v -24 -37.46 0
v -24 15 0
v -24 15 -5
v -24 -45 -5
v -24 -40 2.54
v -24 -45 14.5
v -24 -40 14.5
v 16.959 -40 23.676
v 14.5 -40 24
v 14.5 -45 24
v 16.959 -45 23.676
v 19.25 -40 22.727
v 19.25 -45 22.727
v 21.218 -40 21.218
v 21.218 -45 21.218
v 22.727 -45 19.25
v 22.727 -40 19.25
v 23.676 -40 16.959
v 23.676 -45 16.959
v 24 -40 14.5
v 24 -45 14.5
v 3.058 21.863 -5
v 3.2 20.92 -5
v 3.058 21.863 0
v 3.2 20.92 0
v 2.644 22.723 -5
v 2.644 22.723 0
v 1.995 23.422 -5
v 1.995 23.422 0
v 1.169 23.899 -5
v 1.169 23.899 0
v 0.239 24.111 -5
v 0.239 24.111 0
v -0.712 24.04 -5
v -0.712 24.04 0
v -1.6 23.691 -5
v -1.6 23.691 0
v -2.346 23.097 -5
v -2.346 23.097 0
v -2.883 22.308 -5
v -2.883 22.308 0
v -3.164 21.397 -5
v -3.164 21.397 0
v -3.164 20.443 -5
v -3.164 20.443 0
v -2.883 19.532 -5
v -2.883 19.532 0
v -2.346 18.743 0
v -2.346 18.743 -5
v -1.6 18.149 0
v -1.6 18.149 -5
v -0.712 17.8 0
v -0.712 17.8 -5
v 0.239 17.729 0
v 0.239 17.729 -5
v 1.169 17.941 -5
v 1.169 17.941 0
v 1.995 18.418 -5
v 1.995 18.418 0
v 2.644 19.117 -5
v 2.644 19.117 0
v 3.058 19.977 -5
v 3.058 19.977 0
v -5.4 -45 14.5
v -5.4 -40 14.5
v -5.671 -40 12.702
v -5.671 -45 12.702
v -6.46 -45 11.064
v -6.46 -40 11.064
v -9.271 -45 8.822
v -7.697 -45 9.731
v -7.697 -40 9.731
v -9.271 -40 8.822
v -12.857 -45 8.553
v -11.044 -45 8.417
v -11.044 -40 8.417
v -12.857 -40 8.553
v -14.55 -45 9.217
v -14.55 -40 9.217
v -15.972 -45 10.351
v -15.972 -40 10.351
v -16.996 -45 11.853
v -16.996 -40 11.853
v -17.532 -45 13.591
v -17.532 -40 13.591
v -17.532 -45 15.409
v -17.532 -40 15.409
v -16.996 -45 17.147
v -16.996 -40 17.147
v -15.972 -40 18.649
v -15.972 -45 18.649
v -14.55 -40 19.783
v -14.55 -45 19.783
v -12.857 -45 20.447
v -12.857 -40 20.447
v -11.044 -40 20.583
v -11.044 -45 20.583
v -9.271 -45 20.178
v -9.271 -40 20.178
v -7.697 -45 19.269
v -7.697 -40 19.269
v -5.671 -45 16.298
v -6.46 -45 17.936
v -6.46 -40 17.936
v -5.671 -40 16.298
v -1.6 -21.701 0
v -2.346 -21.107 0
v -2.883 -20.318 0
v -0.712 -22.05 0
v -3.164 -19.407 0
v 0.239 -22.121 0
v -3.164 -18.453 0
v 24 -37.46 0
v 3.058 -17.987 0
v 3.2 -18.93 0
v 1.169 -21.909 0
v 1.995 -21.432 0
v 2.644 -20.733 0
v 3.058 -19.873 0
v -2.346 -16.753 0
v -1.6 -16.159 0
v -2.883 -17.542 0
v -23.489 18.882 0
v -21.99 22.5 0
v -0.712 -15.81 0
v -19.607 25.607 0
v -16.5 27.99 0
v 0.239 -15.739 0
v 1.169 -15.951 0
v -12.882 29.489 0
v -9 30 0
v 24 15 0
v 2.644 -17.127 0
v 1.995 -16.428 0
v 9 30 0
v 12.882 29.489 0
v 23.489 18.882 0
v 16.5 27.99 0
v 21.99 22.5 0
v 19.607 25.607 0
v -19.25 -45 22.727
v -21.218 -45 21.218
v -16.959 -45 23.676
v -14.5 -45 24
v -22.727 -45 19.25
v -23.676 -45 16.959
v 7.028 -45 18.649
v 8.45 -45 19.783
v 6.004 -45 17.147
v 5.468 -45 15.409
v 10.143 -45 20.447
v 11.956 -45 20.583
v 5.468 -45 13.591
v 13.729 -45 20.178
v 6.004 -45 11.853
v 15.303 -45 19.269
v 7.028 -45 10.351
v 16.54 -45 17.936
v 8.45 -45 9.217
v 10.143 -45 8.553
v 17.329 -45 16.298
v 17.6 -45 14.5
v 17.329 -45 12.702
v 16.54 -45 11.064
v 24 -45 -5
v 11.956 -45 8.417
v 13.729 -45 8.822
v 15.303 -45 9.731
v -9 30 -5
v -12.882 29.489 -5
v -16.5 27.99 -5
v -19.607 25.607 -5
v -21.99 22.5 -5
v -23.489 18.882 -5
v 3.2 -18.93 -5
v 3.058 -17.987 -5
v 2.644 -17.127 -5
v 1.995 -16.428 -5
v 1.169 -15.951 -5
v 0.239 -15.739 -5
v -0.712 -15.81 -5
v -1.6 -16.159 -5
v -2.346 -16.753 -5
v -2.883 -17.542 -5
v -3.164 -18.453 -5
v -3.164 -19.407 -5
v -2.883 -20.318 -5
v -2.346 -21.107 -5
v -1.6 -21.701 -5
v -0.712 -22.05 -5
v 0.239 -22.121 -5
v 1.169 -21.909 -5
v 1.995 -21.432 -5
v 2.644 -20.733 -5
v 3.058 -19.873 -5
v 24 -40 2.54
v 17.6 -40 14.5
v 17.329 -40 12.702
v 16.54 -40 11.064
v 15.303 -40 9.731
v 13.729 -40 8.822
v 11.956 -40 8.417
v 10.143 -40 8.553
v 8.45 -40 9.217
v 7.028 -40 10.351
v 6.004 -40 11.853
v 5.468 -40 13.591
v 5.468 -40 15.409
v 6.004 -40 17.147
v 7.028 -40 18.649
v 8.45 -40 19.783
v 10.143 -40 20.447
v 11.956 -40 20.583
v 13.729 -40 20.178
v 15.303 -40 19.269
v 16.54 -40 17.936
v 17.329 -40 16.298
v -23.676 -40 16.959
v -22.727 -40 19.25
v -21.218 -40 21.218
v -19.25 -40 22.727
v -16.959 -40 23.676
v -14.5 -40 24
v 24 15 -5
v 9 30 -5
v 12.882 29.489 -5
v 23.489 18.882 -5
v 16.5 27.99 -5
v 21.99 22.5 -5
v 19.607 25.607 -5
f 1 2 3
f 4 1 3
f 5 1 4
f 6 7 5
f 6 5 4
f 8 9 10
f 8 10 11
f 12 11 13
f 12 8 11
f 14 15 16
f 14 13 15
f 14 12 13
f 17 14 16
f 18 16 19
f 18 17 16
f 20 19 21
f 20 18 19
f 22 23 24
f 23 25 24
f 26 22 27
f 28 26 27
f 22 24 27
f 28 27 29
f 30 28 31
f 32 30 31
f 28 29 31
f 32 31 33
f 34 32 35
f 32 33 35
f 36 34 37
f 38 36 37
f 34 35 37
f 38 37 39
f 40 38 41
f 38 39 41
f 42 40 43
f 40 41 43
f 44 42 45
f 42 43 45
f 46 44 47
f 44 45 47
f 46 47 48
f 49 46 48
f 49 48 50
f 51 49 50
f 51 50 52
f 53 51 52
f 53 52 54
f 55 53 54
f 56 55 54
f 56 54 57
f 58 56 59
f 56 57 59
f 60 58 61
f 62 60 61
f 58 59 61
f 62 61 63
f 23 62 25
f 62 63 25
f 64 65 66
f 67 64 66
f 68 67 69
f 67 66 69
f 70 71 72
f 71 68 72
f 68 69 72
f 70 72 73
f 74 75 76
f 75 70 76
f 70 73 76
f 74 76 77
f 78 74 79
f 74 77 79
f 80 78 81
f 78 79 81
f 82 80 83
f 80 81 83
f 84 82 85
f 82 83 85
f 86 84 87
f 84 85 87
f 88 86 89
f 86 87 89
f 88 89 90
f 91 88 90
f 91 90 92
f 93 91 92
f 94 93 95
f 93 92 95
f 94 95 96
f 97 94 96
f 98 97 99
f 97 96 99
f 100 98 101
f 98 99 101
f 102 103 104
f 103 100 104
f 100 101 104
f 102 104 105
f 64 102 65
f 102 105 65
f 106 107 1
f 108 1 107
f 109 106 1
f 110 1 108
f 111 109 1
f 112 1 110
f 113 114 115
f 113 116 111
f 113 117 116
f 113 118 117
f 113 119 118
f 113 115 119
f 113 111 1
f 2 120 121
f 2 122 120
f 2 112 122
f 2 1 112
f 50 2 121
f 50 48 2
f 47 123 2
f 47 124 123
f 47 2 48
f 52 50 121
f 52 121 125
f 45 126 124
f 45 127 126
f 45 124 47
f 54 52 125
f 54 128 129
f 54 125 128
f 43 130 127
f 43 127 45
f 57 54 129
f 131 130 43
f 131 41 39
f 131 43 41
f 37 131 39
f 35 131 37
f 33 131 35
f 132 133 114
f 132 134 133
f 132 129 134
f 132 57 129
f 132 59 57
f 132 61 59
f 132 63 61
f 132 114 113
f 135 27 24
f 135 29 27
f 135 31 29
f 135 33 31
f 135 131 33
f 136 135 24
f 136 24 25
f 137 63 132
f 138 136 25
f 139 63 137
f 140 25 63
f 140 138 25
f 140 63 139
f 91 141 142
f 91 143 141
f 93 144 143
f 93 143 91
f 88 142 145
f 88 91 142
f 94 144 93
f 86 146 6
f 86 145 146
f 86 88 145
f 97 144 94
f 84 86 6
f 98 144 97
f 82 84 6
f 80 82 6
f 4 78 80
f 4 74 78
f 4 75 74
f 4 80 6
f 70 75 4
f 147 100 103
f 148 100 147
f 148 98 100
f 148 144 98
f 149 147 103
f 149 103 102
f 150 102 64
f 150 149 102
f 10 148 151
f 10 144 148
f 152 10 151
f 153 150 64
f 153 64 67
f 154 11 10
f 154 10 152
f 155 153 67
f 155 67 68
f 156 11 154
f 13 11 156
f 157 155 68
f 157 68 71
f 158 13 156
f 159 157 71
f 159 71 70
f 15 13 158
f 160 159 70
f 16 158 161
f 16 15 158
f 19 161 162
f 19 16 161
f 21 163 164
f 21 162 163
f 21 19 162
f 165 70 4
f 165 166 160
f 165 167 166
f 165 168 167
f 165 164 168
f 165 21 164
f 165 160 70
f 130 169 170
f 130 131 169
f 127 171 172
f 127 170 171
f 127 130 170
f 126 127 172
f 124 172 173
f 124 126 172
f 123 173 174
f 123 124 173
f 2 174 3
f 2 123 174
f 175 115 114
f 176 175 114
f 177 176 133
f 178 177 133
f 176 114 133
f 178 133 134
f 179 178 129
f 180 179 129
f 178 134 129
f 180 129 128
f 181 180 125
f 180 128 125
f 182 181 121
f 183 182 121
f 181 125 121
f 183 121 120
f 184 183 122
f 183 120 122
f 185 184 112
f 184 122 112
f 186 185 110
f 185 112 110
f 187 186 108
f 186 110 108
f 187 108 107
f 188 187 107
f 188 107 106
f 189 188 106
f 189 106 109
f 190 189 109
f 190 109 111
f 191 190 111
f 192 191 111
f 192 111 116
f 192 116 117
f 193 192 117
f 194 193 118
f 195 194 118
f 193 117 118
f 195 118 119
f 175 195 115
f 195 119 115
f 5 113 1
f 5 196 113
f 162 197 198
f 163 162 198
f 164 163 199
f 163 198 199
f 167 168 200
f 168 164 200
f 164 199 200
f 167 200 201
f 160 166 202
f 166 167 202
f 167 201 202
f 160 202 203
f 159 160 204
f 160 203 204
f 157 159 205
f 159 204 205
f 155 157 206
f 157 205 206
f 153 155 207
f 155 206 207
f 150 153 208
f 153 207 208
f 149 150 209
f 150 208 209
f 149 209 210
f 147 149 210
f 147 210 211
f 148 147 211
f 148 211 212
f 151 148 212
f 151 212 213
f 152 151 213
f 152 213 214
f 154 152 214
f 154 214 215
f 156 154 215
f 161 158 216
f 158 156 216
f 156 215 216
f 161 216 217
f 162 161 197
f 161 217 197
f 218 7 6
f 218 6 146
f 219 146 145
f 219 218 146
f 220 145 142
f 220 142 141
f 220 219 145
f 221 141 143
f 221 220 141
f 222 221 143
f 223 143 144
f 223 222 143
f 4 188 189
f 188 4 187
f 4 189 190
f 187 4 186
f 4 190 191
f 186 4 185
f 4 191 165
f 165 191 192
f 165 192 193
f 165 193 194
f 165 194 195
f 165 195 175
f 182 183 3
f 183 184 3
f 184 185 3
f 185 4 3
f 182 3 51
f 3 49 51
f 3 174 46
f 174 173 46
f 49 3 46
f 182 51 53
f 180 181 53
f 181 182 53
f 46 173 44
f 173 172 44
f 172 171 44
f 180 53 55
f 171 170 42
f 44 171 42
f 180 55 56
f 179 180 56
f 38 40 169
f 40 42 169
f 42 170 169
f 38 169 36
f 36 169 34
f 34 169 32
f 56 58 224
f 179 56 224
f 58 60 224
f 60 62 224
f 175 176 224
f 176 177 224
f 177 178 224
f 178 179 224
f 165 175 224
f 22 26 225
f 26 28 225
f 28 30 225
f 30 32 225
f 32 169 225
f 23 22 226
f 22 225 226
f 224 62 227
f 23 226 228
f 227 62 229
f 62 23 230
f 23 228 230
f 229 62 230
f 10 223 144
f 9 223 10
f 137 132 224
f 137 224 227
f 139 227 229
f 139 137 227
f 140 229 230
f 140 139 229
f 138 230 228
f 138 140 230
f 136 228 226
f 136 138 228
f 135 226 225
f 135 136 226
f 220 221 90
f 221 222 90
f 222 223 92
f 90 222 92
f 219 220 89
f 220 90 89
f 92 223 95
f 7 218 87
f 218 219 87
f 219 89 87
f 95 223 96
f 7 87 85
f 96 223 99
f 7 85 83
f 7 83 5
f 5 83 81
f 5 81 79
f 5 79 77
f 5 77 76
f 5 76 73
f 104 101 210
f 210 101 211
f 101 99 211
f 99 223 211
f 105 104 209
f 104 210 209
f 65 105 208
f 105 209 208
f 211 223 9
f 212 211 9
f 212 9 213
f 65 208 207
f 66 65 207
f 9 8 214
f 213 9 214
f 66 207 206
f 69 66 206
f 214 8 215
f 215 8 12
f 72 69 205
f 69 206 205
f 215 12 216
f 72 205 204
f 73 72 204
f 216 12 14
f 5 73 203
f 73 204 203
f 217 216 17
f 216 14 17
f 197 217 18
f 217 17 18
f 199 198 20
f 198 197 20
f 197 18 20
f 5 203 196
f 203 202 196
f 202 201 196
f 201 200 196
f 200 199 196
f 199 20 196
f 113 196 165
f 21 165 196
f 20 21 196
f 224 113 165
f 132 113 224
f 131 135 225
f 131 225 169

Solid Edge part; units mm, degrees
sketch "Sketch1" plane through (0, 0, 0) normal (0, 0, 1) x (1, 0, 0)
  circle A0 centre (0, -18.93) radius 3.2
  circle A1 centre (0, 20.92) radius 3.2
  line L0 (9, 30) -> (-9, 30)
  arc A2 (-24, 15) -> (-9, 30) centre (-9, 15) cw
  line L1 (-24, 15) -> (-24, -40)
  line L2 (-24, -40) -> (24, -40)
  line L3 (24, -40) -> (24, 15)
  arc A3 (9, 30) -> (24, 15) centre (9, 15) cw
  dimension "D1" = 70
  dimension "D2" = 48
extrude "Protrusion1" add sketch "Sketch1" against normal blind 5
sketch "Sketch2" plane through (0, -40, -2.5) normal (0, -1, 0) x (1, 0, 0)
  circle A0 centre (-11.5, 17) radius 6.1
  circle A1 centre (11.5, 17) radius 6.1
  arc A2 (24, 17) -> (14.5, 26.5) centre (14.5, 17) ccw
  line L0 (-14.5, 26.5) -> (14.5, 26.5)
  arc A3 (-24, 17) -> (-14.5, 26.5) centre (-14.5, 17) cw
  line L1 (-24, 17) -> (-24, 7.5)
  line L2 (-24, 7.5) -> (-24, -2.5)
  line L3 (-24, -2.5) -> (24, -2.5)
  line L4 (24, -2.5) -> (24, 7.5)
  line L5 (24, 7.5) -> (24, 17)
  dimension "D1" = 12.5
  dimension "D2" = 9.5
  dimension "D3" = 12.5
  dimension "D4" = 9.5
  dimension "D5" = 9.5
  dimension "D6" = 9.5
extrude "Extrusionsausprägung_2" add sketch "Sketch2" along normal blind 5
chamfer "Fase_1" distance 2.54 angle 45 1 edges at (0, -40, 0)
